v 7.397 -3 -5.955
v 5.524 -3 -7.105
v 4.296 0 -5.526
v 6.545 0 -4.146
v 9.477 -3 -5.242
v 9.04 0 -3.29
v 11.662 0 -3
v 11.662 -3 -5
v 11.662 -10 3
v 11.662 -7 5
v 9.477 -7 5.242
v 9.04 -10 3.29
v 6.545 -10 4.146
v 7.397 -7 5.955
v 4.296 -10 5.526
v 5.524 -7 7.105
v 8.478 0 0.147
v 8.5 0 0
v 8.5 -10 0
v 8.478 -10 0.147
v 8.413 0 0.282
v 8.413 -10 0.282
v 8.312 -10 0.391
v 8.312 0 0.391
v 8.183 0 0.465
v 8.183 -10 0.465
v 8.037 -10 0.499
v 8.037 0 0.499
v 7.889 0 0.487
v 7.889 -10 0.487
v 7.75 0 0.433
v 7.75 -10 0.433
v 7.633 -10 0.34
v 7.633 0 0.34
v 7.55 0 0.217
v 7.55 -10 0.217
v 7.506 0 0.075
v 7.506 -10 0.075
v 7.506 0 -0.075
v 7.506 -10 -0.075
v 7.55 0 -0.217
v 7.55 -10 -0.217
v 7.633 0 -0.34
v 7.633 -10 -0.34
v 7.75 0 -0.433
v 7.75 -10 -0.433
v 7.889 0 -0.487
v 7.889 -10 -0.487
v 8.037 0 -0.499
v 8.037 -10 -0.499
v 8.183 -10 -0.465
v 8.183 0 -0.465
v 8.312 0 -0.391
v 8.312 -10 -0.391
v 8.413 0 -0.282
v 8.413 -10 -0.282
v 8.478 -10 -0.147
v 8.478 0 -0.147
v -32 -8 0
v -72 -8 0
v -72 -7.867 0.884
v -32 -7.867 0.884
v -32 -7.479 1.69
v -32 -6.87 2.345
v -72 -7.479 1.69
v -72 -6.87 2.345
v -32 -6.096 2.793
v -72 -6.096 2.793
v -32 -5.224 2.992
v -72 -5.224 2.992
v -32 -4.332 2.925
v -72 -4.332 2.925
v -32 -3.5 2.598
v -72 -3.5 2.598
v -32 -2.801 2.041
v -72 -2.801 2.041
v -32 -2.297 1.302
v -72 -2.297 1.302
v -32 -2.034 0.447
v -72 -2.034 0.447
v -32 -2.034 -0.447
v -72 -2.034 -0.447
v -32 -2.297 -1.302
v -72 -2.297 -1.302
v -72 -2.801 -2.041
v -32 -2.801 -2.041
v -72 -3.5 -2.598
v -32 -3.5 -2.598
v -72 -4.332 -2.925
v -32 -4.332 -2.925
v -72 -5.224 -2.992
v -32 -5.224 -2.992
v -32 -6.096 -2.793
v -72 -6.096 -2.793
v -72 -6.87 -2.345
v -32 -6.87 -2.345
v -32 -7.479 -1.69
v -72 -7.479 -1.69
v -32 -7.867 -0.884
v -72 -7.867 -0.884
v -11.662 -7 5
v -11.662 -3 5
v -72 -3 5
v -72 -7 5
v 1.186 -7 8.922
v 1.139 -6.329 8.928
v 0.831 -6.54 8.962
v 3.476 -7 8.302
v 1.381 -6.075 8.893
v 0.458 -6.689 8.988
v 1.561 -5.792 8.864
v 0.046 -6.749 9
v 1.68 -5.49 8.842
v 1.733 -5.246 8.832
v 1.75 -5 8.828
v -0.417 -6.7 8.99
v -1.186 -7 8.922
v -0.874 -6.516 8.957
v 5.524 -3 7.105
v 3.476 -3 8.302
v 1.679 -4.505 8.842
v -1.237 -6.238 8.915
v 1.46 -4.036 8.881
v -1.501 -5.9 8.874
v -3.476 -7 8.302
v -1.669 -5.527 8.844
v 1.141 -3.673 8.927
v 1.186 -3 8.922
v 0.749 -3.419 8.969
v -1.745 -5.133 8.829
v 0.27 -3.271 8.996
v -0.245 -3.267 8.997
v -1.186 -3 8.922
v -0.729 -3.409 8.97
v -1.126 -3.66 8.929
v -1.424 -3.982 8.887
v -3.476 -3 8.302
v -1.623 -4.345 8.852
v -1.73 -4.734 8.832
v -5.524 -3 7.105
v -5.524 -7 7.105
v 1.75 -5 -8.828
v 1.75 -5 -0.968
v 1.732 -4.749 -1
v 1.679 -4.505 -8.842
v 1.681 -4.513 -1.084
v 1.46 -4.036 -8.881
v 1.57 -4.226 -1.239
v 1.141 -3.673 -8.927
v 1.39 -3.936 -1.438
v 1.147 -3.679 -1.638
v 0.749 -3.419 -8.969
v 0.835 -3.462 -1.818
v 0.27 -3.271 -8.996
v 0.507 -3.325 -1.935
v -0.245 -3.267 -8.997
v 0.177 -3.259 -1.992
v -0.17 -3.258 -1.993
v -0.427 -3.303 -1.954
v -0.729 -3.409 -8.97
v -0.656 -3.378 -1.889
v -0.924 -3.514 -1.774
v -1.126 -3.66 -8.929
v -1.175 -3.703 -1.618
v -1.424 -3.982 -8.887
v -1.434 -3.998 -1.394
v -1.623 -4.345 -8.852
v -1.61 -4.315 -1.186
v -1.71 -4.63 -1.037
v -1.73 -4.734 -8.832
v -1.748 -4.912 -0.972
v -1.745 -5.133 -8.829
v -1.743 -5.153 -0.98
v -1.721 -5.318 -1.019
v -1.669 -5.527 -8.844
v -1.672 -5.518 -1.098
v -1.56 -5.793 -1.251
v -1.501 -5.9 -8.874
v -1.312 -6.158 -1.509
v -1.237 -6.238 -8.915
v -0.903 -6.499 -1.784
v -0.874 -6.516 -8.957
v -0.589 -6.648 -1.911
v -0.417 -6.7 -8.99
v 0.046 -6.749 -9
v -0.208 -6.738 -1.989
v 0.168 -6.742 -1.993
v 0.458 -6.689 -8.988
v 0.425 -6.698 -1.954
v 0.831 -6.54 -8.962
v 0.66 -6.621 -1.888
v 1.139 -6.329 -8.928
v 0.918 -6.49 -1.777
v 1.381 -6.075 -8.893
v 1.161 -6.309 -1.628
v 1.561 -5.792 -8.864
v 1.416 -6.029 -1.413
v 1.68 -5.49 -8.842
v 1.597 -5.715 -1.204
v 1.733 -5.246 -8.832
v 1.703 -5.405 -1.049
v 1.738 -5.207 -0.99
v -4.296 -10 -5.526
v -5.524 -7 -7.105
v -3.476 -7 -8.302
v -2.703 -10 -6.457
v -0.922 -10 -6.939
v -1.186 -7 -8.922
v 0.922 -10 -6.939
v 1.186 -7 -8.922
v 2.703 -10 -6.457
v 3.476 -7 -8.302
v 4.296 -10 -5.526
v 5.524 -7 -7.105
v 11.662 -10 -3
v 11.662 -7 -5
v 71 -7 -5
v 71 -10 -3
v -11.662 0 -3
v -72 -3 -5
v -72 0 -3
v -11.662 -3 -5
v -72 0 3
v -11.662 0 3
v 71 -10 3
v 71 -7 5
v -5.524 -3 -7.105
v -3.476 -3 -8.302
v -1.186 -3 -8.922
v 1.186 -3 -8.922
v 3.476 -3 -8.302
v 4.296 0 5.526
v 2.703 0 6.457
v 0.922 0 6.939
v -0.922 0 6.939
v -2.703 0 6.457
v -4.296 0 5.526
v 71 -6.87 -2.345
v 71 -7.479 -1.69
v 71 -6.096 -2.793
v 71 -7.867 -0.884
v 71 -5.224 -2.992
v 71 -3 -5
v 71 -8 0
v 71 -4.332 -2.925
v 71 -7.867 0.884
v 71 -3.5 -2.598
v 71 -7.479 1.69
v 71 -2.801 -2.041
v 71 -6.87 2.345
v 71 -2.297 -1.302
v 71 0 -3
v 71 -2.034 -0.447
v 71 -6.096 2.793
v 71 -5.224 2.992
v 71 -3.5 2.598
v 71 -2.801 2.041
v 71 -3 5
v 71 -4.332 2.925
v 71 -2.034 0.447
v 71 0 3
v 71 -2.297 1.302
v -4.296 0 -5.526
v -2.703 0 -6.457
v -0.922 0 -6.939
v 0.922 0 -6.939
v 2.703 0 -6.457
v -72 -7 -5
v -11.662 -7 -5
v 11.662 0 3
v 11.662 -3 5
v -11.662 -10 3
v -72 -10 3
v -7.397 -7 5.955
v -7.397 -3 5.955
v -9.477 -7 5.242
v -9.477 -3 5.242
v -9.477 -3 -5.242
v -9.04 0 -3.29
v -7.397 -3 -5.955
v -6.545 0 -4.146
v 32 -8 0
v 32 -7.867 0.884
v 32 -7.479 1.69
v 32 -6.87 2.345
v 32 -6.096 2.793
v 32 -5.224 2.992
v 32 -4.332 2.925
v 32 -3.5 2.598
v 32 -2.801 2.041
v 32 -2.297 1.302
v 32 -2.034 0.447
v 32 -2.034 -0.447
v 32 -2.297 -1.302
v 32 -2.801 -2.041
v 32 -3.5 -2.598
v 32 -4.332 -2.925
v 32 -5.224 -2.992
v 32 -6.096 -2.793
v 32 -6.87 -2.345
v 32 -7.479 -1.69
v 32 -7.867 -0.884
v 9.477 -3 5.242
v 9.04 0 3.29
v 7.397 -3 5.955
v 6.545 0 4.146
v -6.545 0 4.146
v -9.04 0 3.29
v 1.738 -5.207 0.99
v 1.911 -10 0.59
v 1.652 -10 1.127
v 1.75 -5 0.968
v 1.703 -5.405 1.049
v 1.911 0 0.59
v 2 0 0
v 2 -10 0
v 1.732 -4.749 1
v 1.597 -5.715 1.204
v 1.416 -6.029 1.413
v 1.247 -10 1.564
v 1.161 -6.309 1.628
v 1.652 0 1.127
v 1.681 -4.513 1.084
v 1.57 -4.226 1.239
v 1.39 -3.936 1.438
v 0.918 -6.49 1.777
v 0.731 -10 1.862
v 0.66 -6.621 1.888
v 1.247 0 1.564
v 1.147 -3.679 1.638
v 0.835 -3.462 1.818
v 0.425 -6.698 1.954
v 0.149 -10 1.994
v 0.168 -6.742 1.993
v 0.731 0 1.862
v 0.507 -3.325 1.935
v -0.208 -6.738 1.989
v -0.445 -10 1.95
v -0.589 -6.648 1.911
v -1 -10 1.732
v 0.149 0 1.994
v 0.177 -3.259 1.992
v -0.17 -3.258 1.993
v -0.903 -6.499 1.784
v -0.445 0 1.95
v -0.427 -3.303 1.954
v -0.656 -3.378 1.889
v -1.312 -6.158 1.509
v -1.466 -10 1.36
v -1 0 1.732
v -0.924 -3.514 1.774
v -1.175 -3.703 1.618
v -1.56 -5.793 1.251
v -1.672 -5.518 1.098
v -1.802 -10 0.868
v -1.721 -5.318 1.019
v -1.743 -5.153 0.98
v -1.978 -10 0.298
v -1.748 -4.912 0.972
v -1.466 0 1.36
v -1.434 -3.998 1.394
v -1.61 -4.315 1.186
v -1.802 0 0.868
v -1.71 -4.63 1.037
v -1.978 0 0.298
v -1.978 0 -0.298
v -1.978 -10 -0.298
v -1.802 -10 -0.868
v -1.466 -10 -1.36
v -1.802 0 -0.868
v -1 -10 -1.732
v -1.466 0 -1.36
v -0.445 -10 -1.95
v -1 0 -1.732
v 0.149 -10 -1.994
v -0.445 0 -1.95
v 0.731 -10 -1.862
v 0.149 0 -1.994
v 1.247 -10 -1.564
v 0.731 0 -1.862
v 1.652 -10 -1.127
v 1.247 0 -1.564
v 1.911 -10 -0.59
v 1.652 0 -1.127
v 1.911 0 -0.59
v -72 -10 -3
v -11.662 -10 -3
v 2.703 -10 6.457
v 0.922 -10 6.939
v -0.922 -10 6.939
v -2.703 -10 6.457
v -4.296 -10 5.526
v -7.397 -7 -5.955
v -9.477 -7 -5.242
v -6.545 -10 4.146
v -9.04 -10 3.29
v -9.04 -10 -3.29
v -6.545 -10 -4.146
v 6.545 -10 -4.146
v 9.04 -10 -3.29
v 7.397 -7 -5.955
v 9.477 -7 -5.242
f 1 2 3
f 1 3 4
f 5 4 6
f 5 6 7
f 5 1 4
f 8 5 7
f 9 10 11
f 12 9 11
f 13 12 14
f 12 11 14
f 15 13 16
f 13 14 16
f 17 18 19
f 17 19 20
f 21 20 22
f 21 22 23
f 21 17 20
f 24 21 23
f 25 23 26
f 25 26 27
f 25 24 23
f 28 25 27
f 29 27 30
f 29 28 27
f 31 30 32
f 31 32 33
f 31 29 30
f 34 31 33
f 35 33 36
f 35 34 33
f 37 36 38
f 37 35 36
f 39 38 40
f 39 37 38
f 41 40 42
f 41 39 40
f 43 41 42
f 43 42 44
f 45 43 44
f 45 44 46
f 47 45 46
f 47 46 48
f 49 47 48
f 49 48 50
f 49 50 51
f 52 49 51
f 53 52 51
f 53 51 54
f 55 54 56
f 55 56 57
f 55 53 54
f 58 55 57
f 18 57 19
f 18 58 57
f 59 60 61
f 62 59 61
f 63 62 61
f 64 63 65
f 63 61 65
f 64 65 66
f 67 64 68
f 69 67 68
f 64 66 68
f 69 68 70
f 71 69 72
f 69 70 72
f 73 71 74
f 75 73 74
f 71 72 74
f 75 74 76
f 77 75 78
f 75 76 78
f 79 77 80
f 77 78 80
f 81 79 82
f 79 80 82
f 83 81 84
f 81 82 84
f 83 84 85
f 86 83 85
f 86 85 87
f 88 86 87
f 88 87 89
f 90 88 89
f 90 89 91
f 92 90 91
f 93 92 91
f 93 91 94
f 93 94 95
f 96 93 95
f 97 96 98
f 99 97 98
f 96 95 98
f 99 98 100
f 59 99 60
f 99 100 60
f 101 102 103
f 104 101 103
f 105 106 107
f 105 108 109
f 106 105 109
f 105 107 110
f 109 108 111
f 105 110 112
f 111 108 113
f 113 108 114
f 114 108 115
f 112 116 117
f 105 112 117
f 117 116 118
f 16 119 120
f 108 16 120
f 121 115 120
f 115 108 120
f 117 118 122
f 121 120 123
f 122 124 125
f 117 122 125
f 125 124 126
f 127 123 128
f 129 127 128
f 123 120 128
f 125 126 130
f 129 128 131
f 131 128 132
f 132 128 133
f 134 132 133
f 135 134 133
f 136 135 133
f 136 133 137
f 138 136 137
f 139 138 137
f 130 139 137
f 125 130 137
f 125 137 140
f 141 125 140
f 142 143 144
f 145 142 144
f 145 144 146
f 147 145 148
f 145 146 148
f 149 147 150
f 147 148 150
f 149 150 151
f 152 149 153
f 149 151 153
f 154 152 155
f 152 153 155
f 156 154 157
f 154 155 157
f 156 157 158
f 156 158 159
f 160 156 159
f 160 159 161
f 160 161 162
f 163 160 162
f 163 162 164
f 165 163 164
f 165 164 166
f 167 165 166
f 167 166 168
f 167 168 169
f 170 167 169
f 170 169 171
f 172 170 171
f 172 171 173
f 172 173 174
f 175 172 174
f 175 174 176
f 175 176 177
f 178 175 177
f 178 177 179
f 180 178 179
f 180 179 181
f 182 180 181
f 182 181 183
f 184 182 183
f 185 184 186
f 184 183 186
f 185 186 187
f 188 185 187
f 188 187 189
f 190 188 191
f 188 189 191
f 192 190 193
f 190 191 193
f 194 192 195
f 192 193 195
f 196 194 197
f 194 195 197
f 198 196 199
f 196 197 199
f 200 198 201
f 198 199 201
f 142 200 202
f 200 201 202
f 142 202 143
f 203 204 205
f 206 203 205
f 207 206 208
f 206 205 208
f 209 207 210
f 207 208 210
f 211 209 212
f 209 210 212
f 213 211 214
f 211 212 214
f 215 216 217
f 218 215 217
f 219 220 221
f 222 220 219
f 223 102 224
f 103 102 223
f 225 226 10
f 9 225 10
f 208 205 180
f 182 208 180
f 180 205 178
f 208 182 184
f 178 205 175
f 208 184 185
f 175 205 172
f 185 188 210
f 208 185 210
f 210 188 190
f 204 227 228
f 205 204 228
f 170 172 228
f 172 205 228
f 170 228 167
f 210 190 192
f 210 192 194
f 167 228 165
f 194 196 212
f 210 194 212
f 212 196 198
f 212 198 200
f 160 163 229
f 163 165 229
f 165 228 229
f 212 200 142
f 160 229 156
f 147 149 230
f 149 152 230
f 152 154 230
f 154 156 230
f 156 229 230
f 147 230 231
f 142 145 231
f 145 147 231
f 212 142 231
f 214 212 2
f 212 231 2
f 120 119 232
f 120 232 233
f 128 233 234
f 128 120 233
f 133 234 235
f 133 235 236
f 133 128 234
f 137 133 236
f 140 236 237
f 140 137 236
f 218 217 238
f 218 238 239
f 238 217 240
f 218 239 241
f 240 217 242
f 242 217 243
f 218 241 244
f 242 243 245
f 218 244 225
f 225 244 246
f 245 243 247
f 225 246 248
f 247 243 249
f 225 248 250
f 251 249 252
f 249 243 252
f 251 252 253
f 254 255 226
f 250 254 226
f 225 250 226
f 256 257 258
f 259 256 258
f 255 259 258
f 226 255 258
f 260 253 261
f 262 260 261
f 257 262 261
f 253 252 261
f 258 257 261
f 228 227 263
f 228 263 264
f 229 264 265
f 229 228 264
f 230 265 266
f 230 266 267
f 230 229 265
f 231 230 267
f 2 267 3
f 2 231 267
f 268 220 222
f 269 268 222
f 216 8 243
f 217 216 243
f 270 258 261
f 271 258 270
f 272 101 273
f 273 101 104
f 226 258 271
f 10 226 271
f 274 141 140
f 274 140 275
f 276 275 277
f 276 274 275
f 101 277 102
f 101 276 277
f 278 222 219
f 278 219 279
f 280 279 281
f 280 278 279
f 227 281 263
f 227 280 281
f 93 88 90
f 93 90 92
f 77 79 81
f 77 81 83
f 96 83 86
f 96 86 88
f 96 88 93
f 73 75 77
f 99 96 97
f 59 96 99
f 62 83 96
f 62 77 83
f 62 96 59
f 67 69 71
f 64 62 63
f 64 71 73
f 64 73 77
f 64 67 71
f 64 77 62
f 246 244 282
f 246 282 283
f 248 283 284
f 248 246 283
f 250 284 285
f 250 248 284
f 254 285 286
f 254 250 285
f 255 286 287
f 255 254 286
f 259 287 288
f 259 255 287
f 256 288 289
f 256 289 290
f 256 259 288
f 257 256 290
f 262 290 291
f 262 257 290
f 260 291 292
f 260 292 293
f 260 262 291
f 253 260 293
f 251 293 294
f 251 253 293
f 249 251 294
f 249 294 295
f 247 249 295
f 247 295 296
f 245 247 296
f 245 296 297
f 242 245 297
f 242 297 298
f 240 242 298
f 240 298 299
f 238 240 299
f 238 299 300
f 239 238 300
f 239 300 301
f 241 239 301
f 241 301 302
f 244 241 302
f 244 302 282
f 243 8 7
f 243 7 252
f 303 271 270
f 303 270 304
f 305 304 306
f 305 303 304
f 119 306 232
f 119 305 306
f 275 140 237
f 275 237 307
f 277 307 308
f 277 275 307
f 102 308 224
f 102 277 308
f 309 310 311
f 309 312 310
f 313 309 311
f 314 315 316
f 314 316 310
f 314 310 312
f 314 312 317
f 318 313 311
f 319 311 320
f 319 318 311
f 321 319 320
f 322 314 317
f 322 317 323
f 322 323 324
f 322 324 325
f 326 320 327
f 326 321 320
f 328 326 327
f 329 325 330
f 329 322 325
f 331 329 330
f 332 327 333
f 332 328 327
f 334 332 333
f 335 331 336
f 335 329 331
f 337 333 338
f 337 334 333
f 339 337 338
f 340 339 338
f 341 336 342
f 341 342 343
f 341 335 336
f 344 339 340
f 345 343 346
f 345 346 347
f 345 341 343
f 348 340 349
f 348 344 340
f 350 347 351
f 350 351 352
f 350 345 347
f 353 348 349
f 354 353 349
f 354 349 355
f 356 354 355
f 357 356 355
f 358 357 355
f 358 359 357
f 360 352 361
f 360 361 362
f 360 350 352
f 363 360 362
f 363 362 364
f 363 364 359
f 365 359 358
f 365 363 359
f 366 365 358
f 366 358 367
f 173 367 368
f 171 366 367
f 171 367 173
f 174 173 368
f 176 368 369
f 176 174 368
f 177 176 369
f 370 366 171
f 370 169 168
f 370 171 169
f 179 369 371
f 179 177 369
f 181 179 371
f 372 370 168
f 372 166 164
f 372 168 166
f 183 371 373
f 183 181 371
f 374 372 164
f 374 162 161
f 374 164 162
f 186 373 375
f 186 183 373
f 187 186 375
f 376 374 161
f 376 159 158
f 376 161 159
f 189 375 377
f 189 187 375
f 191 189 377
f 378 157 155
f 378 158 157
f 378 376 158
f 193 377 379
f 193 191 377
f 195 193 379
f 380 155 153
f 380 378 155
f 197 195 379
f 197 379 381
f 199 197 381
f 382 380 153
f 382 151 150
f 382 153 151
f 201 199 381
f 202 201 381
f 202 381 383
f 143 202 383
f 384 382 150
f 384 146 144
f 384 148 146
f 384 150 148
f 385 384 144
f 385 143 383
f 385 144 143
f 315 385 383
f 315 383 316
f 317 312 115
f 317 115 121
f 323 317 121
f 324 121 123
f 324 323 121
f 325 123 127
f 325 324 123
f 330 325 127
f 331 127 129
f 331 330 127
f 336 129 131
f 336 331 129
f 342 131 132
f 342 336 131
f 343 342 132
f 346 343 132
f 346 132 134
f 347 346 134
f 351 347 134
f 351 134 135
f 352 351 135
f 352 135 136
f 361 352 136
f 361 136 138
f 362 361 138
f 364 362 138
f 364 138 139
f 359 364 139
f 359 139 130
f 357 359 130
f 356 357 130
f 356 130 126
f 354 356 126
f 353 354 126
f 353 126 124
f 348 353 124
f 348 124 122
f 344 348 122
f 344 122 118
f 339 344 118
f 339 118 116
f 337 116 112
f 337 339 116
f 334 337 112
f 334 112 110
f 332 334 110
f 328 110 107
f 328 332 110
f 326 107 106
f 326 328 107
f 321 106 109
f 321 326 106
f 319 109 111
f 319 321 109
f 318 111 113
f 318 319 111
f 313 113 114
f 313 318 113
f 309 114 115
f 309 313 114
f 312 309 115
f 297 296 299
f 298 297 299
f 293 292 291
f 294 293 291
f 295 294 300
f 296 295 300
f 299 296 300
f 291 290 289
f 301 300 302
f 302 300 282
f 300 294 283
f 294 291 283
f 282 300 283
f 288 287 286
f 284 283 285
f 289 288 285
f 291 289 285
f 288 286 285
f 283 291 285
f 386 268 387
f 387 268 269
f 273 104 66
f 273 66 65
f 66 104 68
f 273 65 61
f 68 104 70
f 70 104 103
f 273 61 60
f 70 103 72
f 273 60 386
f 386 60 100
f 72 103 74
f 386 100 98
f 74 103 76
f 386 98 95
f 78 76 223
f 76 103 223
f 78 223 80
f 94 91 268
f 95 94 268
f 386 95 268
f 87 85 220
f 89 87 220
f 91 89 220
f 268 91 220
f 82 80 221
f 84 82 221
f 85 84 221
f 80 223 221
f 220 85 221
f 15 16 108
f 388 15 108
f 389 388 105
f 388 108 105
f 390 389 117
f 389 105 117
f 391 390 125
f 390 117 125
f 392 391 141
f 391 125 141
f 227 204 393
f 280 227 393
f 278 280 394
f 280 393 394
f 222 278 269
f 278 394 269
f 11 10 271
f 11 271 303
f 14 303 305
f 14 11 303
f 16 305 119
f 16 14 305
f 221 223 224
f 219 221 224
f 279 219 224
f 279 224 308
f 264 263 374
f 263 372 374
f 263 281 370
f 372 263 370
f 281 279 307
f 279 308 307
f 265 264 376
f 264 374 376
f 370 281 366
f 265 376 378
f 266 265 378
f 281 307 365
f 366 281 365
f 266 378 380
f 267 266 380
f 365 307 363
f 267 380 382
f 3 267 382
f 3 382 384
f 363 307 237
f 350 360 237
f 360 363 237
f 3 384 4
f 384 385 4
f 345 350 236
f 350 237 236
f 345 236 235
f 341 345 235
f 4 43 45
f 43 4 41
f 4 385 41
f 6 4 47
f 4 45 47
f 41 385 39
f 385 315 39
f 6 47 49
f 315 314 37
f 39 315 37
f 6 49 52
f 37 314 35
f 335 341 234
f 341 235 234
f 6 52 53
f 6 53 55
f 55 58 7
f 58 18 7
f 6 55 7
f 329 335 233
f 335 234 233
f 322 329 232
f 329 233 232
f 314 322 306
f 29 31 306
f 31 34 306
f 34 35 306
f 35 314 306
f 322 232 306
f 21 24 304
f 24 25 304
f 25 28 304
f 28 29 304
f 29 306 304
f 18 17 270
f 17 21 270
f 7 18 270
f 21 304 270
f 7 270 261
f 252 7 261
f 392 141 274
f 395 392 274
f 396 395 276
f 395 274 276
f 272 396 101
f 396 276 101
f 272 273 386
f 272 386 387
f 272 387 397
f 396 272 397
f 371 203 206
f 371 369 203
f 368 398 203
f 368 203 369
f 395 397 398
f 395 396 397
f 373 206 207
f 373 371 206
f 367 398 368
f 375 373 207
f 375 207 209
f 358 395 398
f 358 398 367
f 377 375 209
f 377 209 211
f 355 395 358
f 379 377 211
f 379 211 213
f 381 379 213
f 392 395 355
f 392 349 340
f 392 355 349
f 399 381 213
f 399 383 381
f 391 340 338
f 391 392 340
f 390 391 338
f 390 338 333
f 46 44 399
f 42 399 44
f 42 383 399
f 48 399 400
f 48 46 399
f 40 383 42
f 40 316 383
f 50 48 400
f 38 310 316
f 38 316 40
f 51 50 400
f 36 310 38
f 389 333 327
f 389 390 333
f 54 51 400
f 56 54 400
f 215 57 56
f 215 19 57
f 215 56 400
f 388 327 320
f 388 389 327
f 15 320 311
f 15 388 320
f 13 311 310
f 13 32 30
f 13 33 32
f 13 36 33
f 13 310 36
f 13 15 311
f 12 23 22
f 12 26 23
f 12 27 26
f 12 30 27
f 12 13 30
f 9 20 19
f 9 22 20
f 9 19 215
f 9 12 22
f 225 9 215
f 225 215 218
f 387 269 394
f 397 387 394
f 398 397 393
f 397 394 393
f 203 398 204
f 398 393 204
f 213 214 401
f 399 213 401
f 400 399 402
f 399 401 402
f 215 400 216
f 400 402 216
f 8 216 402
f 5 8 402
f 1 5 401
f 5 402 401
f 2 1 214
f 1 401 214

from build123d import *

# Parameters (mm, degrees)
F0_R          = 2
F0_R_2        = 0.5
F1_DEPTH      = 10
F2_R          = 3
F3_DEPTH      = 40
F4_R          = 1.75
F5_DEPTH      = 9.001
F5_DEPTH_BACK = 9.001
F6_R          = 10
F7_SIZE2      = 3
F7_SIZE       = 2
F7_2_SIZE2    = 3
F7_2_SIZE     = 2


# Not quite as in the source:
# - a pattern or mirror of a feature is missing from the dataset's text; its kind, count and spacing are read off the source's solid


with BuildPart() as f1:
    # F0 (on Front) → F1 (new body)
    with BuildSketch(Plane.XZ):
        with BuildLine():
            Line((71, 5), (7.4833147735, 5))
            ThreePointArc((7.4833147735, 5), (0, 9), (-7.4833147735, 5))
            Line((-7.4833147735, 5), (-72, 5))
            Line((-72, 5), (-72, -5))
            Line((-72, -5), (-7.4833147735, -5))
            ThreePointArc((-7.4833147735, -5), (0, -9), (7.4833147735, -5))
            Line((7.4833147735, -5), (71, -5))
            Line((71, -5), (71, 5))
        make_face()
        Circle(F0_R, mode=Mode.SUBTRACT)
        with Locations((8, 0)):
            Circle(F0_R_2, mode=Mode.SUBTRACT)
    extrude(amount=F1_DEPTH)

    # F2 (on face) → F3 (cut)
    with BuildSketch(Plane(origin=(-72, 0, 0), x_dir=(0, -1, 0), z_dir=(-1, 0, 0))):
        with Locations((5, 0)):
            Circle(F2_R)
    f3 = extrude(amount=-F3_DEPTH, mode=Mode.SUBTRACT)

    # F3_copies: F3 across plane
    add(f3.mirror(Plane(origin=(0, 0, 0), x_dir=(0, 0, 1), z_dir=(1, 0, 0))), mode=Mode.SUBTRACT)

    # F4 (on Top) → F5 (cut, two sides)
    with BuildSketch(Plane.XY) as f5_sk:
        with Locations((0, -5)):
            Circle(F4_R)
    extrude(amount=-F5_DEPTH, mode=Mode.SUBTRACT)
    extrude(f5_sk.sketch, amount=F5_DEPTH_BACK, mode=Mode.SUBTRACT)

    # F6
    f6_edges = [f1.edges().sort_by_distance(p)[0] for p in [
        (-7.483315, -5, 5),
        (7.483315, -5, 5),
        (7.483315, -5, -5),
        (-7.483315, -5, -5),
    ]]
    fillet(f6_edges, radius=F6_R)

    # F7
    f7_edges = [f1.edges().sort_by_distance(p)[0] for p in [
        (-41.830952, -10, 5),
        (-41.830952, -10, -5),
    ]]
    f7_side = f1.faces().sort_by_distance((41.330952, -10, -3.558716))[0]
    chamfer(f7_edges, length=F7_SIZE, length2=F7_SIZE2, reference=f7_side)

    # F7#2
    f7_2_edges = [f1.edges().sort_by_distance(p)[0] for p in [
        (-41.830952, 0, 5),
        (-41.830952, 0, -5),
    ]]
    f7_2_side = f1.faces().sort_by_distance((41.330952, 0, -3.558716))[0]
    chamfer(f7_2_edges, length=F7_2_SIZE, length2=F7_2_SIZE2, reference=f7_2_side)


solid = f1.part
